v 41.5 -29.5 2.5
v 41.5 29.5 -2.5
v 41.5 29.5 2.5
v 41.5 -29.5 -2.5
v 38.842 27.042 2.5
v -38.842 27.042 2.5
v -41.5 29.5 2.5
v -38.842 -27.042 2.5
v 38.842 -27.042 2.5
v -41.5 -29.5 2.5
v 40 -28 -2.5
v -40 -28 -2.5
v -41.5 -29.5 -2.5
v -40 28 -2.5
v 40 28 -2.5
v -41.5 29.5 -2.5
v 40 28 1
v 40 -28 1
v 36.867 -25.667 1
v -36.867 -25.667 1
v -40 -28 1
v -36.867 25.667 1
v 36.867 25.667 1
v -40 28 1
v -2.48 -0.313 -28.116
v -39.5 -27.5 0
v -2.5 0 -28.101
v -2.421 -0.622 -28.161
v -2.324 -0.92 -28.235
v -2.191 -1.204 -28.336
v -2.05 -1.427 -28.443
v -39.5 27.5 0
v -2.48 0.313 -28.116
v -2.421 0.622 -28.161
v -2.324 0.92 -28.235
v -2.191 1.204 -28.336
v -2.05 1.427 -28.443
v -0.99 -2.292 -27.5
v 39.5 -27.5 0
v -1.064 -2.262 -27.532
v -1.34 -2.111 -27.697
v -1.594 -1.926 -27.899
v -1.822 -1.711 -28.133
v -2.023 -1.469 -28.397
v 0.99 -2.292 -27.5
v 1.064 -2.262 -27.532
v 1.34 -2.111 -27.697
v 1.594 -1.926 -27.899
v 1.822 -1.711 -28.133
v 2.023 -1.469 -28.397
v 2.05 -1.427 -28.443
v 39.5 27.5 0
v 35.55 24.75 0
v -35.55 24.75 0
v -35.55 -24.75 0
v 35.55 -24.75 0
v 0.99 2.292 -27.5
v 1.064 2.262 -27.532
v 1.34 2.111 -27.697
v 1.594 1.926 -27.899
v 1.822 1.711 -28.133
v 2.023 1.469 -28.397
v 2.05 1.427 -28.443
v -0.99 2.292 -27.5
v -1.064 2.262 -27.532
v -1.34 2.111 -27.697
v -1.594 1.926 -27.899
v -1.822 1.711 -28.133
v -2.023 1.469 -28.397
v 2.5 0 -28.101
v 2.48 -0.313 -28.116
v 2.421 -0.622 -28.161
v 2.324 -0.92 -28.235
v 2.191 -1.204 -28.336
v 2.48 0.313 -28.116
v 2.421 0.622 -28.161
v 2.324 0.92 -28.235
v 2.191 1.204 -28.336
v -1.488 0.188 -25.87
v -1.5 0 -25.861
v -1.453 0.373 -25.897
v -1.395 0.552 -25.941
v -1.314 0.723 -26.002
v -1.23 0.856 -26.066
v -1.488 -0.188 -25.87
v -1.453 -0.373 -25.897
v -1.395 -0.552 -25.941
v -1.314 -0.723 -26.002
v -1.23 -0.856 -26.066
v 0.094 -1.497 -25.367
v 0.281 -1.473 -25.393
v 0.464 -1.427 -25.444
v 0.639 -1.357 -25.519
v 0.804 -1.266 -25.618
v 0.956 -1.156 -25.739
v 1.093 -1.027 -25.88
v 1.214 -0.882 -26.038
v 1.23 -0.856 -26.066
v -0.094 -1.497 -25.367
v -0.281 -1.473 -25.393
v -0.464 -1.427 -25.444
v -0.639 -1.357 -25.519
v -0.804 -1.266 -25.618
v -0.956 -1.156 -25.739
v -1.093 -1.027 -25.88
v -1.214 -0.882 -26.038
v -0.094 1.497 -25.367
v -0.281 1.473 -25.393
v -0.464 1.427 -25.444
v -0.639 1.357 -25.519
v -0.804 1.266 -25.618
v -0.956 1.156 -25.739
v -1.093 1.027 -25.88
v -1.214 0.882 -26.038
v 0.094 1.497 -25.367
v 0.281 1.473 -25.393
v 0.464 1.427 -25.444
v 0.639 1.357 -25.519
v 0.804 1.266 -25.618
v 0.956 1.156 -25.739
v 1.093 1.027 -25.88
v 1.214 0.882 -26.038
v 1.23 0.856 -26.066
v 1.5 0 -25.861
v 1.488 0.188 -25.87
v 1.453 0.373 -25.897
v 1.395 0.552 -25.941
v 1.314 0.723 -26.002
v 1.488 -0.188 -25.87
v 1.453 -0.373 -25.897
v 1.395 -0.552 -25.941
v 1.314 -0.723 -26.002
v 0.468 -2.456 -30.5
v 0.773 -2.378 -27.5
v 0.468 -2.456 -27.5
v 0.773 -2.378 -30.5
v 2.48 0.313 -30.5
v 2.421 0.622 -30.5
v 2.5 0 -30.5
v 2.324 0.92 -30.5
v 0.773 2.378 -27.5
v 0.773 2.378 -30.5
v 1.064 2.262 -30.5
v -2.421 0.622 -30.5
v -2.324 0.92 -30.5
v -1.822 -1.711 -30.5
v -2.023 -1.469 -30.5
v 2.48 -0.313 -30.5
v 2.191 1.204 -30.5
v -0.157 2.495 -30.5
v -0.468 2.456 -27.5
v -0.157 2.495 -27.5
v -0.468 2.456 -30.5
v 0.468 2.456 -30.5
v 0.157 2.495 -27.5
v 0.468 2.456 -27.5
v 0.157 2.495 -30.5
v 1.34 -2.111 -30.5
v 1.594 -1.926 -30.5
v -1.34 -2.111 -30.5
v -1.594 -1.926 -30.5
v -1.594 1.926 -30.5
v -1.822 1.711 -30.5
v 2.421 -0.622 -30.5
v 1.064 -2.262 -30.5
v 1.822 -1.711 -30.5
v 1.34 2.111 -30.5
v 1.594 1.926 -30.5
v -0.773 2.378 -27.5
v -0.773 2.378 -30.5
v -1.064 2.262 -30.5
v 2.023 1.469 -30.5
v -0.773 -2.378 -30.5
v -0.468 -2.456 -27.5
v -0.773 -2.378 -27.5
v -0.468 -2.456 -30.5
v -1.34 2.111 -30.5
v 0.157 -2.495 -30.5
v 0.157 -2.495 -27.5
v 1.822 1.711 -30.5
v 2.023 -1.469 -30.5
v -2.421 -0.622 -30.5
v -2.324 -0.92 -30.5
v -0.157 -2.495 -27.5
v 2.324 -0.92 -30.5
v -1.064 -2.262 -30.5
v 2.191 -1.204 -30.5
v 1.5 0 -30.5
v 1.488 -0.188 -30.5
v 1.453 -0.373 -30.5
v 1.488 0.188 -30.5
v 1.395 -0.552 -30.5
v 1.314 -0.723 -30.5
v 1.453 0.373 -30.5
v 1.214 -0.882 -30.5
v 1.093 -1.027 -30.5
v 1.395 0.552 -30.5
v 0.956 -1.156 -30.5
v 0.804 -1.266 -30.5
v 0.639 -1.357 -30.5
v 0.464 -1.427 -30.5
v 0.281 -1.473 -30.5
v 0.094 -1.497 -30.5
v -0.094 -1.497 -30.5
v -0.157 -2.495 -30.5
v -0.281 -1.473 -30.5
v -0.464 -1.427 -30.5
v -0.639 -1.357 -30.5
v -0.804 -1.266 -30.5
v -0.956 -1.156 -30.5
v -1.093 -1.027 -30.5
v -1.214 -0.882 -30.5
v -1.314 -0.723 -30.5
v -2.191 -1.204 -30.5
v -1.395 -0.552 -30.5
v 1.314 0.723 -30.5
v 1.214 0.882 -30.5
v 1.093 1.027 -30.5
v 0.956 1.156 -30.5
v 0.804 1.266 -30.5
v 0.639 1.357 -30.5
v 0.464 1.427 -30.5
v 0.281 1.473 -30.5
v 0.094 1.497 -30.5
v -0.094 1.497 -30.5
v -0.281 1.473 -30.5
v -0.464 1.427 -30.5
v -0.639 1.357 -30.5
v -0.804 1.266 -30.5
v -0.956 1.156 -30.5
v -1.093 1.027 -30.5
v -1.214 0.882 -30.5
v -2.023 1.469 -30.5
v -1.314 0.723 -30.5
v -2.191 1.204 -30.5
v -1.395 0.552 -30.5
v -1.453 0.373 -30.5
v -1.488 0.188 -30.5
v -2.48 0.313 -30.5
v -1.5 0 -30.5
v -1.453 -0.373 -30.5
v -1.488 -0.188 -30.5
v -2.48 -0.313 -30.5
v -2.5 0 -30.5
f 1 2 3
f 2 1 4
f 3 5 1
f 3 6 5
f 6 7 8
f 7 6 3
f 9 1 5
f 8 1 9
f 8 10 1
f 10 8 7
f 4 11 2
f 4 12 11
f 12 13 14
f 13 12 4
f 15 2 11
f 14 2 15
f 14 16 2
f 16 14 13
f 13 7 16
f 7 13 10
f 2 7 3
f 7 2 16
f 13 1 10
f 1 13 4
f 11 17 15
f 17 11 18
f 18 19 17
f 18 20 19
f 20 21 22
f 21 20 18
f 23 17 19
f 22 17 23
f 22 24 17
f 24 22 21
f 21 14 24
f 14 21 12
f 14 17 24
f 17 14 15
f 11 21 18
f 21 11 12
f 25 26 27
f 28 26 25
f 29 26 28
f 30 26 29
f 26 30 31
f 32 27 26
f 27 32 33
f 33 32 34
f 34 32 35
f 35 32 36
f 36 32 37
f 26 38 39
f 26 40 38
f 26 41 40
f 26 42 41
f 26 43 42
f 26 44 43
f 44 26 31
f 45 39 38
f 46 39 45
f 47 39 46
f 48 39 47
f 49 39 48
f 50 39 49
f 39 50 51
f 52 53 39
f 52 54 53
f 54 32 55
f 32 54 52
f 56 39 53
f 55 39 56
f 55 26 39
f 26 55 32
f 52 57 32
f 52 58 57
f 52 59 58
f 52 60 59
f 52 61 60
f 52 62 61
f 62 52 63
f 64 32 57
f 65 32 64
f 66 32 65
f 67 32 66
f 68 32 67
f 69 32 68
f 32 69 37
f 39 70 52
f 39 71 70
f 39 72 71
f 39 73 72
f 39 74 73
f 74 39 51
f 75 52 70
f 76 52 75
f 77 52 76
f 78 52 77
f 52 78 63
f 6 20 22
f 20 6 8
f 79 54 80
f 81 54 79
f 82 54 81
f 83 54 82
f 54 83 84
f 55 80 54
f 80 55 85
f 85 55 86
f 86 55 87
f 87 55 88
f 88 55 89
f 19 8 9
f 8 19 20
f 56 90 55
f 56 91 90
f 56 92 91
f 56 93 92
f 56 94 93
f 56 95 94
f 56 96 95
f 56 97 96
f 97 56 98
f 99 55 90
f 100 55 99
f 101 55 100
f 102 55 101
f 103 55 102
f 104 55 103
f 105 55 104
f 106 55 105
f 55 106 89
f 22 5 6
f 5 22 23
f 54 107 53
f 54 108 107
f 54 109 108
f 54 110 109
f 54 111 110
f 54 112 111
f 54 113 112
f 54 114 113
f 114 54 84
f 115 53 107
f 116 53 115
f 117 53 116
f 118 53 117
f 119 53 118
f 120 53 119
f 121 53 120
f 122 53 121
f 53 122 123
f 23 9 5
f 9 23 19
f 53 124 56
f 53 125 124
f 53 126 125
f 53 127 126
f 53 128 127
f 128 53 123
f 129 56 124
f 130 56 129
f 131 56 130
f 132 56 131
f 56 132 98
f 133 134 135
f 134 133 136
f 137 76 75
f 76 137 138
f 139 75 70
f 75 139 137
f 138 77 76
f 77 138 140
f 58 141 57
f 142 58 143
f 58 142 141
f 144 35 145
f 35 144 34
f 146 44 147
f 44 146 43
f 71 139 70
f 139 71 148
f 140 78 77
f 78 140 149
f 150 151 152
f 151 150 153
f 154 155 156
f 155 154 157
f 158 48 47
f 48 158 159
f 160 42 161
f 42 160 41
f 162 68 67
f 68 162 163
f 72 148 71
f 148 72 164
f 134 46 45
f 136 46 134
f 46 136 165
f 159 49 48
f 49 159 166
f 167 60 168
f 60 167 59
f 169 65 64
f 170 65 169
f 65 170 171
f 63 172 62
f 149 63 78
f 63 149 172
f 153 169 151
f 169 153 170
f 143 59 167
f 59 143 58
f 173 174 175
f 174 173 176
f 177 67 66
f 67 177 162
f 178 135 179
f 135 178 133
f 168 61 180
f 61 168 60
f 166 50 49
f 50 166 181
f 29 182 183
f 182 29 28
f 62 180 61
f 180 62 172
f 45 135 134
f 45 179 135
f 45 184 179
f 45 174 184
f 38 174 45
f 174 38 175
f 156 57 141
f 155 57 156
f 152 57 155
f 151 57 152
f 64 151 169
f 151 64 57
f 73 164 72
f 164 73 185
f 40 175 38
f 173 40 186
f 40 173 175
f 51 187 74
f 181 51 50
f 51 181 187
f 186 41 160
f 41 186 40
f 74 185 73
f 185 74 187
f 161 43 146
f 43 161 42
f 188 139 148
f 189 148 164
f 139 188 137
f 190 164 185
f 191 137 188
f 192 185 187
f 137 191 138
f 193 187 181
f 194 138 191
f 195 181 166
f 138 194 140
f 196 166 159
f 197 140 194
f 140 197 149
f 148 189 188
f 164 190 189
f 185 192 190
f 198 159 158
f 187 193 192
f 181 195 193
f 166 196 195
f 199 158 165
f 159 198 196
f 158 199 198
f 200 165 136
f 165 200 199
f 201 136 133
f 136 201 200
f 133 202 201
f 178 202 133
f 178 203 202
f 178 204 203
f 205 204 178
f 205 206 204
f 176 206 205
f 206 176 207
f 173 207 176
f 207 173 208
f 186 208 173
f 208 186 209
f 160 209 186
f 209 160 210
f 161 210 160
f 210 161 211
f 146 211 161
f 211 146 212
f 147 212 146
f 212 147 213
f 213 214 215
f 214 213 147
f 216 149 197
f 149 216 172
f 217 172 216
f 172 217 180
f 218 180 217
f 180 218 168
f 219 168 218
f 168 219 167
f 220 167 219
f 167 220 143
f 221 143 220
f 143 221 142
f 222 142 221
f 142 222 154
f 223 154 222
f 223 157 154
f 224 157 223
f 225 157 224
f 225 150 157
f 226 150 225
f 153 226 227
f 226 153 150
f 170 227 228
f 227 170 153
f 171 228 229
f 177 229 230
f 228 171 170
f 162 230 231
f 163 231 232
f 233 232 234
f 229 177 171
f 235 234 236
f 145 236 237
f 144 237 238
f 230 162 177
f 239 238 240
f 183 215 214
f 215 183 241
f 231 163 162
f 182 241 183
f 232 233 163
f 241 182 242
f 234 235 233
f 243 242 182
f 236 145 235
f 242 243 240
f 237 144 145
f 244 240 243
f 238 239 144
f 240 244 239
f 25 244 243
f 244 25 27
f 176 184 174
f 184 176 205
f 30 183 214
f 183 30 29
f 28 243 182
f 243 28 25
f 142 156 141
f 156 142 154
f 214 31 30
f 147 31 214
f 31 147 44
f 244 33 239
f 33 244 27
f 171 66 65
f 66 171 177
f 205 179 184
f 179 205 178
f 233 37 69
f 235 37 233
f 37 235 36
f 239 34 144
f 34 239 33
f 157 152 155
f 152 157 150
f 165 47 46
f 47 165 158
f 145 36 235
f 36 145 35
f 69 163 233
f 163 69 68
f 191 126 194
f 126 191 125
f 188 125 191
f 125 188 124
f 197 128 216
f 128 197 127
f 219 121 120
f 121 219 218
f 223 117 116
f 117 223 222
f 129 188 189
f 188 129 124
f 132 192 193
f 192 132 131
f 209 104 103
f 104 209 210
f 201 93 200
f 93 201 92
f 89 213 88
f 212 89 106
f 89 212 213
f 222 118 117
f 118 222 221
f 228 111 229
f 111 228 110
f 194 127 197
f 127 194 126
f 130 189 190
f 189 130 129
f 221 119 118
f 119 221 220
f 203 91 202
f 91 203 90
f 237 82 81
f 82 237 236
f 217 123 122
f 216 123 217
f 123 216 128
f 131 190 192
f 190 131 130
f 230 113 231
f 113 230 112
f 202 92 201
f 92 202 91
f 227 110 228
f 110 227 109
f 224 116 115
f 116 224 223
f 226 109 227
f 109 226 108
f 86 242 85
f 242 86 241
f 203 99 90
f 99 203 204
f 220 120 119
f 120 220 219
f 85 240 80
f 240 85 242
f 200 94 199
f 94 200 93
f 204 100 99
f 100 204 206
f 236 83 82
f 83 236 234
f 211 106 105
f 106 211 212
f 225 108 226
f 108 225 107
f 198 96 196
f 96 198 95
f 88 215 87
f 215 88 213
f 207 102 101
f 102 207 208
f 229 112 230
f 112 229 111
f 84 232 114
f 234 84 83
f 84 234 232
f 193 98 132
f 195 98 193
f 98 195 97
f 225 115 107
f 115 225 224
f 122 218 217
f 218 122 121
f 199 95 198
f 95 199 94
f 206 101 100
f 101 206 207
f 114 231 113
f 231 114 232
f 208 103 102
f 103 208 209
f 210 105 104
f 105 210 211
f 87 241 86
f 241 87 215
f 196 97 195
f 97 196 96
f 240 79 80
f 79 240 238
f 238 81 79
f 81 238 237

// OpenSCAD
// file: raingauge_parameters.scad
$fn = 50;
thickness = 1;
magnet_diameter = 14;
magnet_thickness = 4.5;
tipper_width = 55;
tipper_depth = 24;
tipper_height =15;
tipper_arm = 40;
tipper_arm_width = magnet_diameter+2*thickness;

// Base Parameters

ramp_height = 10;
ramp_depth = tipper_depth+2;
base_width = 80;
base_depth = base_width*0.7;
base_height = base_width*1.25;

tip_height = 30;

hall_effect_holes = 12;


module triangular_section(l,w,h){
    polyhedron(
    points=[[-l,0,0], [l,0,0], [l,w,0], [-l,w,0], [0,0,h], [0,w,h]],
    faces=[[5,4,0,3],[1,2,3,0],[5,2,1,4],[5,3,2],[1,0,4]]
          );
}

module triangular_section2(l,w,h){
    polyhedron(
    points=[[0,0,0], [l,0,0], [l,w,0], [0,w,0], [l,0,h], [l,w,h]],
    faces=[[5,4,0,3],[1,2,3,0],[5,2,1,4],[5,3,2],[1,0,4]]
          );
}

module pyramid(l,w,h){
 polyhedron(
  points=[ [l,w,0],[l,-w,0],[-l,-w,0],[-l,w,0], // the four points at base
           [0,0,h]  ],                                 // the apex point 
  faces=[ [0,1,4],[1,2,4],[2,3,4],[3,0,4],              // each triangle side
              [1,0,3],[2,1,3] ]                         // two triangles for square base
 );
}
// main file
// ----- EXTERNAL FILES
include <raingauge_parameters.scad>
funnel_height = 30;

difference(){
union(){
difference(){
    union(){
        difference(){
            cube([base_width+thickness+2,base_depth+thickness+2,5], center=true); // base
            translate([0,0,-thickness]){
                cube([base_width,base_depth,5-thickness], center=true);
        }}
    rotate([0,180,0]){
        pyramid((base_width-thickness)/2,(base_depth-thickness)/2,funnel_height);
    }}
    translate([0,0,3])
    rotate([0,180,0]){
        pyramid((base_width-thickness)/2,(base_depth-thickness)/2,funnel_height);
    }
}
translate([0,0,-funnel_height+thickness]){
cylinder(h = 3, r=2.5, center=true);
}}
cylinder(h = 1000, r=1.5, center=true);
}
